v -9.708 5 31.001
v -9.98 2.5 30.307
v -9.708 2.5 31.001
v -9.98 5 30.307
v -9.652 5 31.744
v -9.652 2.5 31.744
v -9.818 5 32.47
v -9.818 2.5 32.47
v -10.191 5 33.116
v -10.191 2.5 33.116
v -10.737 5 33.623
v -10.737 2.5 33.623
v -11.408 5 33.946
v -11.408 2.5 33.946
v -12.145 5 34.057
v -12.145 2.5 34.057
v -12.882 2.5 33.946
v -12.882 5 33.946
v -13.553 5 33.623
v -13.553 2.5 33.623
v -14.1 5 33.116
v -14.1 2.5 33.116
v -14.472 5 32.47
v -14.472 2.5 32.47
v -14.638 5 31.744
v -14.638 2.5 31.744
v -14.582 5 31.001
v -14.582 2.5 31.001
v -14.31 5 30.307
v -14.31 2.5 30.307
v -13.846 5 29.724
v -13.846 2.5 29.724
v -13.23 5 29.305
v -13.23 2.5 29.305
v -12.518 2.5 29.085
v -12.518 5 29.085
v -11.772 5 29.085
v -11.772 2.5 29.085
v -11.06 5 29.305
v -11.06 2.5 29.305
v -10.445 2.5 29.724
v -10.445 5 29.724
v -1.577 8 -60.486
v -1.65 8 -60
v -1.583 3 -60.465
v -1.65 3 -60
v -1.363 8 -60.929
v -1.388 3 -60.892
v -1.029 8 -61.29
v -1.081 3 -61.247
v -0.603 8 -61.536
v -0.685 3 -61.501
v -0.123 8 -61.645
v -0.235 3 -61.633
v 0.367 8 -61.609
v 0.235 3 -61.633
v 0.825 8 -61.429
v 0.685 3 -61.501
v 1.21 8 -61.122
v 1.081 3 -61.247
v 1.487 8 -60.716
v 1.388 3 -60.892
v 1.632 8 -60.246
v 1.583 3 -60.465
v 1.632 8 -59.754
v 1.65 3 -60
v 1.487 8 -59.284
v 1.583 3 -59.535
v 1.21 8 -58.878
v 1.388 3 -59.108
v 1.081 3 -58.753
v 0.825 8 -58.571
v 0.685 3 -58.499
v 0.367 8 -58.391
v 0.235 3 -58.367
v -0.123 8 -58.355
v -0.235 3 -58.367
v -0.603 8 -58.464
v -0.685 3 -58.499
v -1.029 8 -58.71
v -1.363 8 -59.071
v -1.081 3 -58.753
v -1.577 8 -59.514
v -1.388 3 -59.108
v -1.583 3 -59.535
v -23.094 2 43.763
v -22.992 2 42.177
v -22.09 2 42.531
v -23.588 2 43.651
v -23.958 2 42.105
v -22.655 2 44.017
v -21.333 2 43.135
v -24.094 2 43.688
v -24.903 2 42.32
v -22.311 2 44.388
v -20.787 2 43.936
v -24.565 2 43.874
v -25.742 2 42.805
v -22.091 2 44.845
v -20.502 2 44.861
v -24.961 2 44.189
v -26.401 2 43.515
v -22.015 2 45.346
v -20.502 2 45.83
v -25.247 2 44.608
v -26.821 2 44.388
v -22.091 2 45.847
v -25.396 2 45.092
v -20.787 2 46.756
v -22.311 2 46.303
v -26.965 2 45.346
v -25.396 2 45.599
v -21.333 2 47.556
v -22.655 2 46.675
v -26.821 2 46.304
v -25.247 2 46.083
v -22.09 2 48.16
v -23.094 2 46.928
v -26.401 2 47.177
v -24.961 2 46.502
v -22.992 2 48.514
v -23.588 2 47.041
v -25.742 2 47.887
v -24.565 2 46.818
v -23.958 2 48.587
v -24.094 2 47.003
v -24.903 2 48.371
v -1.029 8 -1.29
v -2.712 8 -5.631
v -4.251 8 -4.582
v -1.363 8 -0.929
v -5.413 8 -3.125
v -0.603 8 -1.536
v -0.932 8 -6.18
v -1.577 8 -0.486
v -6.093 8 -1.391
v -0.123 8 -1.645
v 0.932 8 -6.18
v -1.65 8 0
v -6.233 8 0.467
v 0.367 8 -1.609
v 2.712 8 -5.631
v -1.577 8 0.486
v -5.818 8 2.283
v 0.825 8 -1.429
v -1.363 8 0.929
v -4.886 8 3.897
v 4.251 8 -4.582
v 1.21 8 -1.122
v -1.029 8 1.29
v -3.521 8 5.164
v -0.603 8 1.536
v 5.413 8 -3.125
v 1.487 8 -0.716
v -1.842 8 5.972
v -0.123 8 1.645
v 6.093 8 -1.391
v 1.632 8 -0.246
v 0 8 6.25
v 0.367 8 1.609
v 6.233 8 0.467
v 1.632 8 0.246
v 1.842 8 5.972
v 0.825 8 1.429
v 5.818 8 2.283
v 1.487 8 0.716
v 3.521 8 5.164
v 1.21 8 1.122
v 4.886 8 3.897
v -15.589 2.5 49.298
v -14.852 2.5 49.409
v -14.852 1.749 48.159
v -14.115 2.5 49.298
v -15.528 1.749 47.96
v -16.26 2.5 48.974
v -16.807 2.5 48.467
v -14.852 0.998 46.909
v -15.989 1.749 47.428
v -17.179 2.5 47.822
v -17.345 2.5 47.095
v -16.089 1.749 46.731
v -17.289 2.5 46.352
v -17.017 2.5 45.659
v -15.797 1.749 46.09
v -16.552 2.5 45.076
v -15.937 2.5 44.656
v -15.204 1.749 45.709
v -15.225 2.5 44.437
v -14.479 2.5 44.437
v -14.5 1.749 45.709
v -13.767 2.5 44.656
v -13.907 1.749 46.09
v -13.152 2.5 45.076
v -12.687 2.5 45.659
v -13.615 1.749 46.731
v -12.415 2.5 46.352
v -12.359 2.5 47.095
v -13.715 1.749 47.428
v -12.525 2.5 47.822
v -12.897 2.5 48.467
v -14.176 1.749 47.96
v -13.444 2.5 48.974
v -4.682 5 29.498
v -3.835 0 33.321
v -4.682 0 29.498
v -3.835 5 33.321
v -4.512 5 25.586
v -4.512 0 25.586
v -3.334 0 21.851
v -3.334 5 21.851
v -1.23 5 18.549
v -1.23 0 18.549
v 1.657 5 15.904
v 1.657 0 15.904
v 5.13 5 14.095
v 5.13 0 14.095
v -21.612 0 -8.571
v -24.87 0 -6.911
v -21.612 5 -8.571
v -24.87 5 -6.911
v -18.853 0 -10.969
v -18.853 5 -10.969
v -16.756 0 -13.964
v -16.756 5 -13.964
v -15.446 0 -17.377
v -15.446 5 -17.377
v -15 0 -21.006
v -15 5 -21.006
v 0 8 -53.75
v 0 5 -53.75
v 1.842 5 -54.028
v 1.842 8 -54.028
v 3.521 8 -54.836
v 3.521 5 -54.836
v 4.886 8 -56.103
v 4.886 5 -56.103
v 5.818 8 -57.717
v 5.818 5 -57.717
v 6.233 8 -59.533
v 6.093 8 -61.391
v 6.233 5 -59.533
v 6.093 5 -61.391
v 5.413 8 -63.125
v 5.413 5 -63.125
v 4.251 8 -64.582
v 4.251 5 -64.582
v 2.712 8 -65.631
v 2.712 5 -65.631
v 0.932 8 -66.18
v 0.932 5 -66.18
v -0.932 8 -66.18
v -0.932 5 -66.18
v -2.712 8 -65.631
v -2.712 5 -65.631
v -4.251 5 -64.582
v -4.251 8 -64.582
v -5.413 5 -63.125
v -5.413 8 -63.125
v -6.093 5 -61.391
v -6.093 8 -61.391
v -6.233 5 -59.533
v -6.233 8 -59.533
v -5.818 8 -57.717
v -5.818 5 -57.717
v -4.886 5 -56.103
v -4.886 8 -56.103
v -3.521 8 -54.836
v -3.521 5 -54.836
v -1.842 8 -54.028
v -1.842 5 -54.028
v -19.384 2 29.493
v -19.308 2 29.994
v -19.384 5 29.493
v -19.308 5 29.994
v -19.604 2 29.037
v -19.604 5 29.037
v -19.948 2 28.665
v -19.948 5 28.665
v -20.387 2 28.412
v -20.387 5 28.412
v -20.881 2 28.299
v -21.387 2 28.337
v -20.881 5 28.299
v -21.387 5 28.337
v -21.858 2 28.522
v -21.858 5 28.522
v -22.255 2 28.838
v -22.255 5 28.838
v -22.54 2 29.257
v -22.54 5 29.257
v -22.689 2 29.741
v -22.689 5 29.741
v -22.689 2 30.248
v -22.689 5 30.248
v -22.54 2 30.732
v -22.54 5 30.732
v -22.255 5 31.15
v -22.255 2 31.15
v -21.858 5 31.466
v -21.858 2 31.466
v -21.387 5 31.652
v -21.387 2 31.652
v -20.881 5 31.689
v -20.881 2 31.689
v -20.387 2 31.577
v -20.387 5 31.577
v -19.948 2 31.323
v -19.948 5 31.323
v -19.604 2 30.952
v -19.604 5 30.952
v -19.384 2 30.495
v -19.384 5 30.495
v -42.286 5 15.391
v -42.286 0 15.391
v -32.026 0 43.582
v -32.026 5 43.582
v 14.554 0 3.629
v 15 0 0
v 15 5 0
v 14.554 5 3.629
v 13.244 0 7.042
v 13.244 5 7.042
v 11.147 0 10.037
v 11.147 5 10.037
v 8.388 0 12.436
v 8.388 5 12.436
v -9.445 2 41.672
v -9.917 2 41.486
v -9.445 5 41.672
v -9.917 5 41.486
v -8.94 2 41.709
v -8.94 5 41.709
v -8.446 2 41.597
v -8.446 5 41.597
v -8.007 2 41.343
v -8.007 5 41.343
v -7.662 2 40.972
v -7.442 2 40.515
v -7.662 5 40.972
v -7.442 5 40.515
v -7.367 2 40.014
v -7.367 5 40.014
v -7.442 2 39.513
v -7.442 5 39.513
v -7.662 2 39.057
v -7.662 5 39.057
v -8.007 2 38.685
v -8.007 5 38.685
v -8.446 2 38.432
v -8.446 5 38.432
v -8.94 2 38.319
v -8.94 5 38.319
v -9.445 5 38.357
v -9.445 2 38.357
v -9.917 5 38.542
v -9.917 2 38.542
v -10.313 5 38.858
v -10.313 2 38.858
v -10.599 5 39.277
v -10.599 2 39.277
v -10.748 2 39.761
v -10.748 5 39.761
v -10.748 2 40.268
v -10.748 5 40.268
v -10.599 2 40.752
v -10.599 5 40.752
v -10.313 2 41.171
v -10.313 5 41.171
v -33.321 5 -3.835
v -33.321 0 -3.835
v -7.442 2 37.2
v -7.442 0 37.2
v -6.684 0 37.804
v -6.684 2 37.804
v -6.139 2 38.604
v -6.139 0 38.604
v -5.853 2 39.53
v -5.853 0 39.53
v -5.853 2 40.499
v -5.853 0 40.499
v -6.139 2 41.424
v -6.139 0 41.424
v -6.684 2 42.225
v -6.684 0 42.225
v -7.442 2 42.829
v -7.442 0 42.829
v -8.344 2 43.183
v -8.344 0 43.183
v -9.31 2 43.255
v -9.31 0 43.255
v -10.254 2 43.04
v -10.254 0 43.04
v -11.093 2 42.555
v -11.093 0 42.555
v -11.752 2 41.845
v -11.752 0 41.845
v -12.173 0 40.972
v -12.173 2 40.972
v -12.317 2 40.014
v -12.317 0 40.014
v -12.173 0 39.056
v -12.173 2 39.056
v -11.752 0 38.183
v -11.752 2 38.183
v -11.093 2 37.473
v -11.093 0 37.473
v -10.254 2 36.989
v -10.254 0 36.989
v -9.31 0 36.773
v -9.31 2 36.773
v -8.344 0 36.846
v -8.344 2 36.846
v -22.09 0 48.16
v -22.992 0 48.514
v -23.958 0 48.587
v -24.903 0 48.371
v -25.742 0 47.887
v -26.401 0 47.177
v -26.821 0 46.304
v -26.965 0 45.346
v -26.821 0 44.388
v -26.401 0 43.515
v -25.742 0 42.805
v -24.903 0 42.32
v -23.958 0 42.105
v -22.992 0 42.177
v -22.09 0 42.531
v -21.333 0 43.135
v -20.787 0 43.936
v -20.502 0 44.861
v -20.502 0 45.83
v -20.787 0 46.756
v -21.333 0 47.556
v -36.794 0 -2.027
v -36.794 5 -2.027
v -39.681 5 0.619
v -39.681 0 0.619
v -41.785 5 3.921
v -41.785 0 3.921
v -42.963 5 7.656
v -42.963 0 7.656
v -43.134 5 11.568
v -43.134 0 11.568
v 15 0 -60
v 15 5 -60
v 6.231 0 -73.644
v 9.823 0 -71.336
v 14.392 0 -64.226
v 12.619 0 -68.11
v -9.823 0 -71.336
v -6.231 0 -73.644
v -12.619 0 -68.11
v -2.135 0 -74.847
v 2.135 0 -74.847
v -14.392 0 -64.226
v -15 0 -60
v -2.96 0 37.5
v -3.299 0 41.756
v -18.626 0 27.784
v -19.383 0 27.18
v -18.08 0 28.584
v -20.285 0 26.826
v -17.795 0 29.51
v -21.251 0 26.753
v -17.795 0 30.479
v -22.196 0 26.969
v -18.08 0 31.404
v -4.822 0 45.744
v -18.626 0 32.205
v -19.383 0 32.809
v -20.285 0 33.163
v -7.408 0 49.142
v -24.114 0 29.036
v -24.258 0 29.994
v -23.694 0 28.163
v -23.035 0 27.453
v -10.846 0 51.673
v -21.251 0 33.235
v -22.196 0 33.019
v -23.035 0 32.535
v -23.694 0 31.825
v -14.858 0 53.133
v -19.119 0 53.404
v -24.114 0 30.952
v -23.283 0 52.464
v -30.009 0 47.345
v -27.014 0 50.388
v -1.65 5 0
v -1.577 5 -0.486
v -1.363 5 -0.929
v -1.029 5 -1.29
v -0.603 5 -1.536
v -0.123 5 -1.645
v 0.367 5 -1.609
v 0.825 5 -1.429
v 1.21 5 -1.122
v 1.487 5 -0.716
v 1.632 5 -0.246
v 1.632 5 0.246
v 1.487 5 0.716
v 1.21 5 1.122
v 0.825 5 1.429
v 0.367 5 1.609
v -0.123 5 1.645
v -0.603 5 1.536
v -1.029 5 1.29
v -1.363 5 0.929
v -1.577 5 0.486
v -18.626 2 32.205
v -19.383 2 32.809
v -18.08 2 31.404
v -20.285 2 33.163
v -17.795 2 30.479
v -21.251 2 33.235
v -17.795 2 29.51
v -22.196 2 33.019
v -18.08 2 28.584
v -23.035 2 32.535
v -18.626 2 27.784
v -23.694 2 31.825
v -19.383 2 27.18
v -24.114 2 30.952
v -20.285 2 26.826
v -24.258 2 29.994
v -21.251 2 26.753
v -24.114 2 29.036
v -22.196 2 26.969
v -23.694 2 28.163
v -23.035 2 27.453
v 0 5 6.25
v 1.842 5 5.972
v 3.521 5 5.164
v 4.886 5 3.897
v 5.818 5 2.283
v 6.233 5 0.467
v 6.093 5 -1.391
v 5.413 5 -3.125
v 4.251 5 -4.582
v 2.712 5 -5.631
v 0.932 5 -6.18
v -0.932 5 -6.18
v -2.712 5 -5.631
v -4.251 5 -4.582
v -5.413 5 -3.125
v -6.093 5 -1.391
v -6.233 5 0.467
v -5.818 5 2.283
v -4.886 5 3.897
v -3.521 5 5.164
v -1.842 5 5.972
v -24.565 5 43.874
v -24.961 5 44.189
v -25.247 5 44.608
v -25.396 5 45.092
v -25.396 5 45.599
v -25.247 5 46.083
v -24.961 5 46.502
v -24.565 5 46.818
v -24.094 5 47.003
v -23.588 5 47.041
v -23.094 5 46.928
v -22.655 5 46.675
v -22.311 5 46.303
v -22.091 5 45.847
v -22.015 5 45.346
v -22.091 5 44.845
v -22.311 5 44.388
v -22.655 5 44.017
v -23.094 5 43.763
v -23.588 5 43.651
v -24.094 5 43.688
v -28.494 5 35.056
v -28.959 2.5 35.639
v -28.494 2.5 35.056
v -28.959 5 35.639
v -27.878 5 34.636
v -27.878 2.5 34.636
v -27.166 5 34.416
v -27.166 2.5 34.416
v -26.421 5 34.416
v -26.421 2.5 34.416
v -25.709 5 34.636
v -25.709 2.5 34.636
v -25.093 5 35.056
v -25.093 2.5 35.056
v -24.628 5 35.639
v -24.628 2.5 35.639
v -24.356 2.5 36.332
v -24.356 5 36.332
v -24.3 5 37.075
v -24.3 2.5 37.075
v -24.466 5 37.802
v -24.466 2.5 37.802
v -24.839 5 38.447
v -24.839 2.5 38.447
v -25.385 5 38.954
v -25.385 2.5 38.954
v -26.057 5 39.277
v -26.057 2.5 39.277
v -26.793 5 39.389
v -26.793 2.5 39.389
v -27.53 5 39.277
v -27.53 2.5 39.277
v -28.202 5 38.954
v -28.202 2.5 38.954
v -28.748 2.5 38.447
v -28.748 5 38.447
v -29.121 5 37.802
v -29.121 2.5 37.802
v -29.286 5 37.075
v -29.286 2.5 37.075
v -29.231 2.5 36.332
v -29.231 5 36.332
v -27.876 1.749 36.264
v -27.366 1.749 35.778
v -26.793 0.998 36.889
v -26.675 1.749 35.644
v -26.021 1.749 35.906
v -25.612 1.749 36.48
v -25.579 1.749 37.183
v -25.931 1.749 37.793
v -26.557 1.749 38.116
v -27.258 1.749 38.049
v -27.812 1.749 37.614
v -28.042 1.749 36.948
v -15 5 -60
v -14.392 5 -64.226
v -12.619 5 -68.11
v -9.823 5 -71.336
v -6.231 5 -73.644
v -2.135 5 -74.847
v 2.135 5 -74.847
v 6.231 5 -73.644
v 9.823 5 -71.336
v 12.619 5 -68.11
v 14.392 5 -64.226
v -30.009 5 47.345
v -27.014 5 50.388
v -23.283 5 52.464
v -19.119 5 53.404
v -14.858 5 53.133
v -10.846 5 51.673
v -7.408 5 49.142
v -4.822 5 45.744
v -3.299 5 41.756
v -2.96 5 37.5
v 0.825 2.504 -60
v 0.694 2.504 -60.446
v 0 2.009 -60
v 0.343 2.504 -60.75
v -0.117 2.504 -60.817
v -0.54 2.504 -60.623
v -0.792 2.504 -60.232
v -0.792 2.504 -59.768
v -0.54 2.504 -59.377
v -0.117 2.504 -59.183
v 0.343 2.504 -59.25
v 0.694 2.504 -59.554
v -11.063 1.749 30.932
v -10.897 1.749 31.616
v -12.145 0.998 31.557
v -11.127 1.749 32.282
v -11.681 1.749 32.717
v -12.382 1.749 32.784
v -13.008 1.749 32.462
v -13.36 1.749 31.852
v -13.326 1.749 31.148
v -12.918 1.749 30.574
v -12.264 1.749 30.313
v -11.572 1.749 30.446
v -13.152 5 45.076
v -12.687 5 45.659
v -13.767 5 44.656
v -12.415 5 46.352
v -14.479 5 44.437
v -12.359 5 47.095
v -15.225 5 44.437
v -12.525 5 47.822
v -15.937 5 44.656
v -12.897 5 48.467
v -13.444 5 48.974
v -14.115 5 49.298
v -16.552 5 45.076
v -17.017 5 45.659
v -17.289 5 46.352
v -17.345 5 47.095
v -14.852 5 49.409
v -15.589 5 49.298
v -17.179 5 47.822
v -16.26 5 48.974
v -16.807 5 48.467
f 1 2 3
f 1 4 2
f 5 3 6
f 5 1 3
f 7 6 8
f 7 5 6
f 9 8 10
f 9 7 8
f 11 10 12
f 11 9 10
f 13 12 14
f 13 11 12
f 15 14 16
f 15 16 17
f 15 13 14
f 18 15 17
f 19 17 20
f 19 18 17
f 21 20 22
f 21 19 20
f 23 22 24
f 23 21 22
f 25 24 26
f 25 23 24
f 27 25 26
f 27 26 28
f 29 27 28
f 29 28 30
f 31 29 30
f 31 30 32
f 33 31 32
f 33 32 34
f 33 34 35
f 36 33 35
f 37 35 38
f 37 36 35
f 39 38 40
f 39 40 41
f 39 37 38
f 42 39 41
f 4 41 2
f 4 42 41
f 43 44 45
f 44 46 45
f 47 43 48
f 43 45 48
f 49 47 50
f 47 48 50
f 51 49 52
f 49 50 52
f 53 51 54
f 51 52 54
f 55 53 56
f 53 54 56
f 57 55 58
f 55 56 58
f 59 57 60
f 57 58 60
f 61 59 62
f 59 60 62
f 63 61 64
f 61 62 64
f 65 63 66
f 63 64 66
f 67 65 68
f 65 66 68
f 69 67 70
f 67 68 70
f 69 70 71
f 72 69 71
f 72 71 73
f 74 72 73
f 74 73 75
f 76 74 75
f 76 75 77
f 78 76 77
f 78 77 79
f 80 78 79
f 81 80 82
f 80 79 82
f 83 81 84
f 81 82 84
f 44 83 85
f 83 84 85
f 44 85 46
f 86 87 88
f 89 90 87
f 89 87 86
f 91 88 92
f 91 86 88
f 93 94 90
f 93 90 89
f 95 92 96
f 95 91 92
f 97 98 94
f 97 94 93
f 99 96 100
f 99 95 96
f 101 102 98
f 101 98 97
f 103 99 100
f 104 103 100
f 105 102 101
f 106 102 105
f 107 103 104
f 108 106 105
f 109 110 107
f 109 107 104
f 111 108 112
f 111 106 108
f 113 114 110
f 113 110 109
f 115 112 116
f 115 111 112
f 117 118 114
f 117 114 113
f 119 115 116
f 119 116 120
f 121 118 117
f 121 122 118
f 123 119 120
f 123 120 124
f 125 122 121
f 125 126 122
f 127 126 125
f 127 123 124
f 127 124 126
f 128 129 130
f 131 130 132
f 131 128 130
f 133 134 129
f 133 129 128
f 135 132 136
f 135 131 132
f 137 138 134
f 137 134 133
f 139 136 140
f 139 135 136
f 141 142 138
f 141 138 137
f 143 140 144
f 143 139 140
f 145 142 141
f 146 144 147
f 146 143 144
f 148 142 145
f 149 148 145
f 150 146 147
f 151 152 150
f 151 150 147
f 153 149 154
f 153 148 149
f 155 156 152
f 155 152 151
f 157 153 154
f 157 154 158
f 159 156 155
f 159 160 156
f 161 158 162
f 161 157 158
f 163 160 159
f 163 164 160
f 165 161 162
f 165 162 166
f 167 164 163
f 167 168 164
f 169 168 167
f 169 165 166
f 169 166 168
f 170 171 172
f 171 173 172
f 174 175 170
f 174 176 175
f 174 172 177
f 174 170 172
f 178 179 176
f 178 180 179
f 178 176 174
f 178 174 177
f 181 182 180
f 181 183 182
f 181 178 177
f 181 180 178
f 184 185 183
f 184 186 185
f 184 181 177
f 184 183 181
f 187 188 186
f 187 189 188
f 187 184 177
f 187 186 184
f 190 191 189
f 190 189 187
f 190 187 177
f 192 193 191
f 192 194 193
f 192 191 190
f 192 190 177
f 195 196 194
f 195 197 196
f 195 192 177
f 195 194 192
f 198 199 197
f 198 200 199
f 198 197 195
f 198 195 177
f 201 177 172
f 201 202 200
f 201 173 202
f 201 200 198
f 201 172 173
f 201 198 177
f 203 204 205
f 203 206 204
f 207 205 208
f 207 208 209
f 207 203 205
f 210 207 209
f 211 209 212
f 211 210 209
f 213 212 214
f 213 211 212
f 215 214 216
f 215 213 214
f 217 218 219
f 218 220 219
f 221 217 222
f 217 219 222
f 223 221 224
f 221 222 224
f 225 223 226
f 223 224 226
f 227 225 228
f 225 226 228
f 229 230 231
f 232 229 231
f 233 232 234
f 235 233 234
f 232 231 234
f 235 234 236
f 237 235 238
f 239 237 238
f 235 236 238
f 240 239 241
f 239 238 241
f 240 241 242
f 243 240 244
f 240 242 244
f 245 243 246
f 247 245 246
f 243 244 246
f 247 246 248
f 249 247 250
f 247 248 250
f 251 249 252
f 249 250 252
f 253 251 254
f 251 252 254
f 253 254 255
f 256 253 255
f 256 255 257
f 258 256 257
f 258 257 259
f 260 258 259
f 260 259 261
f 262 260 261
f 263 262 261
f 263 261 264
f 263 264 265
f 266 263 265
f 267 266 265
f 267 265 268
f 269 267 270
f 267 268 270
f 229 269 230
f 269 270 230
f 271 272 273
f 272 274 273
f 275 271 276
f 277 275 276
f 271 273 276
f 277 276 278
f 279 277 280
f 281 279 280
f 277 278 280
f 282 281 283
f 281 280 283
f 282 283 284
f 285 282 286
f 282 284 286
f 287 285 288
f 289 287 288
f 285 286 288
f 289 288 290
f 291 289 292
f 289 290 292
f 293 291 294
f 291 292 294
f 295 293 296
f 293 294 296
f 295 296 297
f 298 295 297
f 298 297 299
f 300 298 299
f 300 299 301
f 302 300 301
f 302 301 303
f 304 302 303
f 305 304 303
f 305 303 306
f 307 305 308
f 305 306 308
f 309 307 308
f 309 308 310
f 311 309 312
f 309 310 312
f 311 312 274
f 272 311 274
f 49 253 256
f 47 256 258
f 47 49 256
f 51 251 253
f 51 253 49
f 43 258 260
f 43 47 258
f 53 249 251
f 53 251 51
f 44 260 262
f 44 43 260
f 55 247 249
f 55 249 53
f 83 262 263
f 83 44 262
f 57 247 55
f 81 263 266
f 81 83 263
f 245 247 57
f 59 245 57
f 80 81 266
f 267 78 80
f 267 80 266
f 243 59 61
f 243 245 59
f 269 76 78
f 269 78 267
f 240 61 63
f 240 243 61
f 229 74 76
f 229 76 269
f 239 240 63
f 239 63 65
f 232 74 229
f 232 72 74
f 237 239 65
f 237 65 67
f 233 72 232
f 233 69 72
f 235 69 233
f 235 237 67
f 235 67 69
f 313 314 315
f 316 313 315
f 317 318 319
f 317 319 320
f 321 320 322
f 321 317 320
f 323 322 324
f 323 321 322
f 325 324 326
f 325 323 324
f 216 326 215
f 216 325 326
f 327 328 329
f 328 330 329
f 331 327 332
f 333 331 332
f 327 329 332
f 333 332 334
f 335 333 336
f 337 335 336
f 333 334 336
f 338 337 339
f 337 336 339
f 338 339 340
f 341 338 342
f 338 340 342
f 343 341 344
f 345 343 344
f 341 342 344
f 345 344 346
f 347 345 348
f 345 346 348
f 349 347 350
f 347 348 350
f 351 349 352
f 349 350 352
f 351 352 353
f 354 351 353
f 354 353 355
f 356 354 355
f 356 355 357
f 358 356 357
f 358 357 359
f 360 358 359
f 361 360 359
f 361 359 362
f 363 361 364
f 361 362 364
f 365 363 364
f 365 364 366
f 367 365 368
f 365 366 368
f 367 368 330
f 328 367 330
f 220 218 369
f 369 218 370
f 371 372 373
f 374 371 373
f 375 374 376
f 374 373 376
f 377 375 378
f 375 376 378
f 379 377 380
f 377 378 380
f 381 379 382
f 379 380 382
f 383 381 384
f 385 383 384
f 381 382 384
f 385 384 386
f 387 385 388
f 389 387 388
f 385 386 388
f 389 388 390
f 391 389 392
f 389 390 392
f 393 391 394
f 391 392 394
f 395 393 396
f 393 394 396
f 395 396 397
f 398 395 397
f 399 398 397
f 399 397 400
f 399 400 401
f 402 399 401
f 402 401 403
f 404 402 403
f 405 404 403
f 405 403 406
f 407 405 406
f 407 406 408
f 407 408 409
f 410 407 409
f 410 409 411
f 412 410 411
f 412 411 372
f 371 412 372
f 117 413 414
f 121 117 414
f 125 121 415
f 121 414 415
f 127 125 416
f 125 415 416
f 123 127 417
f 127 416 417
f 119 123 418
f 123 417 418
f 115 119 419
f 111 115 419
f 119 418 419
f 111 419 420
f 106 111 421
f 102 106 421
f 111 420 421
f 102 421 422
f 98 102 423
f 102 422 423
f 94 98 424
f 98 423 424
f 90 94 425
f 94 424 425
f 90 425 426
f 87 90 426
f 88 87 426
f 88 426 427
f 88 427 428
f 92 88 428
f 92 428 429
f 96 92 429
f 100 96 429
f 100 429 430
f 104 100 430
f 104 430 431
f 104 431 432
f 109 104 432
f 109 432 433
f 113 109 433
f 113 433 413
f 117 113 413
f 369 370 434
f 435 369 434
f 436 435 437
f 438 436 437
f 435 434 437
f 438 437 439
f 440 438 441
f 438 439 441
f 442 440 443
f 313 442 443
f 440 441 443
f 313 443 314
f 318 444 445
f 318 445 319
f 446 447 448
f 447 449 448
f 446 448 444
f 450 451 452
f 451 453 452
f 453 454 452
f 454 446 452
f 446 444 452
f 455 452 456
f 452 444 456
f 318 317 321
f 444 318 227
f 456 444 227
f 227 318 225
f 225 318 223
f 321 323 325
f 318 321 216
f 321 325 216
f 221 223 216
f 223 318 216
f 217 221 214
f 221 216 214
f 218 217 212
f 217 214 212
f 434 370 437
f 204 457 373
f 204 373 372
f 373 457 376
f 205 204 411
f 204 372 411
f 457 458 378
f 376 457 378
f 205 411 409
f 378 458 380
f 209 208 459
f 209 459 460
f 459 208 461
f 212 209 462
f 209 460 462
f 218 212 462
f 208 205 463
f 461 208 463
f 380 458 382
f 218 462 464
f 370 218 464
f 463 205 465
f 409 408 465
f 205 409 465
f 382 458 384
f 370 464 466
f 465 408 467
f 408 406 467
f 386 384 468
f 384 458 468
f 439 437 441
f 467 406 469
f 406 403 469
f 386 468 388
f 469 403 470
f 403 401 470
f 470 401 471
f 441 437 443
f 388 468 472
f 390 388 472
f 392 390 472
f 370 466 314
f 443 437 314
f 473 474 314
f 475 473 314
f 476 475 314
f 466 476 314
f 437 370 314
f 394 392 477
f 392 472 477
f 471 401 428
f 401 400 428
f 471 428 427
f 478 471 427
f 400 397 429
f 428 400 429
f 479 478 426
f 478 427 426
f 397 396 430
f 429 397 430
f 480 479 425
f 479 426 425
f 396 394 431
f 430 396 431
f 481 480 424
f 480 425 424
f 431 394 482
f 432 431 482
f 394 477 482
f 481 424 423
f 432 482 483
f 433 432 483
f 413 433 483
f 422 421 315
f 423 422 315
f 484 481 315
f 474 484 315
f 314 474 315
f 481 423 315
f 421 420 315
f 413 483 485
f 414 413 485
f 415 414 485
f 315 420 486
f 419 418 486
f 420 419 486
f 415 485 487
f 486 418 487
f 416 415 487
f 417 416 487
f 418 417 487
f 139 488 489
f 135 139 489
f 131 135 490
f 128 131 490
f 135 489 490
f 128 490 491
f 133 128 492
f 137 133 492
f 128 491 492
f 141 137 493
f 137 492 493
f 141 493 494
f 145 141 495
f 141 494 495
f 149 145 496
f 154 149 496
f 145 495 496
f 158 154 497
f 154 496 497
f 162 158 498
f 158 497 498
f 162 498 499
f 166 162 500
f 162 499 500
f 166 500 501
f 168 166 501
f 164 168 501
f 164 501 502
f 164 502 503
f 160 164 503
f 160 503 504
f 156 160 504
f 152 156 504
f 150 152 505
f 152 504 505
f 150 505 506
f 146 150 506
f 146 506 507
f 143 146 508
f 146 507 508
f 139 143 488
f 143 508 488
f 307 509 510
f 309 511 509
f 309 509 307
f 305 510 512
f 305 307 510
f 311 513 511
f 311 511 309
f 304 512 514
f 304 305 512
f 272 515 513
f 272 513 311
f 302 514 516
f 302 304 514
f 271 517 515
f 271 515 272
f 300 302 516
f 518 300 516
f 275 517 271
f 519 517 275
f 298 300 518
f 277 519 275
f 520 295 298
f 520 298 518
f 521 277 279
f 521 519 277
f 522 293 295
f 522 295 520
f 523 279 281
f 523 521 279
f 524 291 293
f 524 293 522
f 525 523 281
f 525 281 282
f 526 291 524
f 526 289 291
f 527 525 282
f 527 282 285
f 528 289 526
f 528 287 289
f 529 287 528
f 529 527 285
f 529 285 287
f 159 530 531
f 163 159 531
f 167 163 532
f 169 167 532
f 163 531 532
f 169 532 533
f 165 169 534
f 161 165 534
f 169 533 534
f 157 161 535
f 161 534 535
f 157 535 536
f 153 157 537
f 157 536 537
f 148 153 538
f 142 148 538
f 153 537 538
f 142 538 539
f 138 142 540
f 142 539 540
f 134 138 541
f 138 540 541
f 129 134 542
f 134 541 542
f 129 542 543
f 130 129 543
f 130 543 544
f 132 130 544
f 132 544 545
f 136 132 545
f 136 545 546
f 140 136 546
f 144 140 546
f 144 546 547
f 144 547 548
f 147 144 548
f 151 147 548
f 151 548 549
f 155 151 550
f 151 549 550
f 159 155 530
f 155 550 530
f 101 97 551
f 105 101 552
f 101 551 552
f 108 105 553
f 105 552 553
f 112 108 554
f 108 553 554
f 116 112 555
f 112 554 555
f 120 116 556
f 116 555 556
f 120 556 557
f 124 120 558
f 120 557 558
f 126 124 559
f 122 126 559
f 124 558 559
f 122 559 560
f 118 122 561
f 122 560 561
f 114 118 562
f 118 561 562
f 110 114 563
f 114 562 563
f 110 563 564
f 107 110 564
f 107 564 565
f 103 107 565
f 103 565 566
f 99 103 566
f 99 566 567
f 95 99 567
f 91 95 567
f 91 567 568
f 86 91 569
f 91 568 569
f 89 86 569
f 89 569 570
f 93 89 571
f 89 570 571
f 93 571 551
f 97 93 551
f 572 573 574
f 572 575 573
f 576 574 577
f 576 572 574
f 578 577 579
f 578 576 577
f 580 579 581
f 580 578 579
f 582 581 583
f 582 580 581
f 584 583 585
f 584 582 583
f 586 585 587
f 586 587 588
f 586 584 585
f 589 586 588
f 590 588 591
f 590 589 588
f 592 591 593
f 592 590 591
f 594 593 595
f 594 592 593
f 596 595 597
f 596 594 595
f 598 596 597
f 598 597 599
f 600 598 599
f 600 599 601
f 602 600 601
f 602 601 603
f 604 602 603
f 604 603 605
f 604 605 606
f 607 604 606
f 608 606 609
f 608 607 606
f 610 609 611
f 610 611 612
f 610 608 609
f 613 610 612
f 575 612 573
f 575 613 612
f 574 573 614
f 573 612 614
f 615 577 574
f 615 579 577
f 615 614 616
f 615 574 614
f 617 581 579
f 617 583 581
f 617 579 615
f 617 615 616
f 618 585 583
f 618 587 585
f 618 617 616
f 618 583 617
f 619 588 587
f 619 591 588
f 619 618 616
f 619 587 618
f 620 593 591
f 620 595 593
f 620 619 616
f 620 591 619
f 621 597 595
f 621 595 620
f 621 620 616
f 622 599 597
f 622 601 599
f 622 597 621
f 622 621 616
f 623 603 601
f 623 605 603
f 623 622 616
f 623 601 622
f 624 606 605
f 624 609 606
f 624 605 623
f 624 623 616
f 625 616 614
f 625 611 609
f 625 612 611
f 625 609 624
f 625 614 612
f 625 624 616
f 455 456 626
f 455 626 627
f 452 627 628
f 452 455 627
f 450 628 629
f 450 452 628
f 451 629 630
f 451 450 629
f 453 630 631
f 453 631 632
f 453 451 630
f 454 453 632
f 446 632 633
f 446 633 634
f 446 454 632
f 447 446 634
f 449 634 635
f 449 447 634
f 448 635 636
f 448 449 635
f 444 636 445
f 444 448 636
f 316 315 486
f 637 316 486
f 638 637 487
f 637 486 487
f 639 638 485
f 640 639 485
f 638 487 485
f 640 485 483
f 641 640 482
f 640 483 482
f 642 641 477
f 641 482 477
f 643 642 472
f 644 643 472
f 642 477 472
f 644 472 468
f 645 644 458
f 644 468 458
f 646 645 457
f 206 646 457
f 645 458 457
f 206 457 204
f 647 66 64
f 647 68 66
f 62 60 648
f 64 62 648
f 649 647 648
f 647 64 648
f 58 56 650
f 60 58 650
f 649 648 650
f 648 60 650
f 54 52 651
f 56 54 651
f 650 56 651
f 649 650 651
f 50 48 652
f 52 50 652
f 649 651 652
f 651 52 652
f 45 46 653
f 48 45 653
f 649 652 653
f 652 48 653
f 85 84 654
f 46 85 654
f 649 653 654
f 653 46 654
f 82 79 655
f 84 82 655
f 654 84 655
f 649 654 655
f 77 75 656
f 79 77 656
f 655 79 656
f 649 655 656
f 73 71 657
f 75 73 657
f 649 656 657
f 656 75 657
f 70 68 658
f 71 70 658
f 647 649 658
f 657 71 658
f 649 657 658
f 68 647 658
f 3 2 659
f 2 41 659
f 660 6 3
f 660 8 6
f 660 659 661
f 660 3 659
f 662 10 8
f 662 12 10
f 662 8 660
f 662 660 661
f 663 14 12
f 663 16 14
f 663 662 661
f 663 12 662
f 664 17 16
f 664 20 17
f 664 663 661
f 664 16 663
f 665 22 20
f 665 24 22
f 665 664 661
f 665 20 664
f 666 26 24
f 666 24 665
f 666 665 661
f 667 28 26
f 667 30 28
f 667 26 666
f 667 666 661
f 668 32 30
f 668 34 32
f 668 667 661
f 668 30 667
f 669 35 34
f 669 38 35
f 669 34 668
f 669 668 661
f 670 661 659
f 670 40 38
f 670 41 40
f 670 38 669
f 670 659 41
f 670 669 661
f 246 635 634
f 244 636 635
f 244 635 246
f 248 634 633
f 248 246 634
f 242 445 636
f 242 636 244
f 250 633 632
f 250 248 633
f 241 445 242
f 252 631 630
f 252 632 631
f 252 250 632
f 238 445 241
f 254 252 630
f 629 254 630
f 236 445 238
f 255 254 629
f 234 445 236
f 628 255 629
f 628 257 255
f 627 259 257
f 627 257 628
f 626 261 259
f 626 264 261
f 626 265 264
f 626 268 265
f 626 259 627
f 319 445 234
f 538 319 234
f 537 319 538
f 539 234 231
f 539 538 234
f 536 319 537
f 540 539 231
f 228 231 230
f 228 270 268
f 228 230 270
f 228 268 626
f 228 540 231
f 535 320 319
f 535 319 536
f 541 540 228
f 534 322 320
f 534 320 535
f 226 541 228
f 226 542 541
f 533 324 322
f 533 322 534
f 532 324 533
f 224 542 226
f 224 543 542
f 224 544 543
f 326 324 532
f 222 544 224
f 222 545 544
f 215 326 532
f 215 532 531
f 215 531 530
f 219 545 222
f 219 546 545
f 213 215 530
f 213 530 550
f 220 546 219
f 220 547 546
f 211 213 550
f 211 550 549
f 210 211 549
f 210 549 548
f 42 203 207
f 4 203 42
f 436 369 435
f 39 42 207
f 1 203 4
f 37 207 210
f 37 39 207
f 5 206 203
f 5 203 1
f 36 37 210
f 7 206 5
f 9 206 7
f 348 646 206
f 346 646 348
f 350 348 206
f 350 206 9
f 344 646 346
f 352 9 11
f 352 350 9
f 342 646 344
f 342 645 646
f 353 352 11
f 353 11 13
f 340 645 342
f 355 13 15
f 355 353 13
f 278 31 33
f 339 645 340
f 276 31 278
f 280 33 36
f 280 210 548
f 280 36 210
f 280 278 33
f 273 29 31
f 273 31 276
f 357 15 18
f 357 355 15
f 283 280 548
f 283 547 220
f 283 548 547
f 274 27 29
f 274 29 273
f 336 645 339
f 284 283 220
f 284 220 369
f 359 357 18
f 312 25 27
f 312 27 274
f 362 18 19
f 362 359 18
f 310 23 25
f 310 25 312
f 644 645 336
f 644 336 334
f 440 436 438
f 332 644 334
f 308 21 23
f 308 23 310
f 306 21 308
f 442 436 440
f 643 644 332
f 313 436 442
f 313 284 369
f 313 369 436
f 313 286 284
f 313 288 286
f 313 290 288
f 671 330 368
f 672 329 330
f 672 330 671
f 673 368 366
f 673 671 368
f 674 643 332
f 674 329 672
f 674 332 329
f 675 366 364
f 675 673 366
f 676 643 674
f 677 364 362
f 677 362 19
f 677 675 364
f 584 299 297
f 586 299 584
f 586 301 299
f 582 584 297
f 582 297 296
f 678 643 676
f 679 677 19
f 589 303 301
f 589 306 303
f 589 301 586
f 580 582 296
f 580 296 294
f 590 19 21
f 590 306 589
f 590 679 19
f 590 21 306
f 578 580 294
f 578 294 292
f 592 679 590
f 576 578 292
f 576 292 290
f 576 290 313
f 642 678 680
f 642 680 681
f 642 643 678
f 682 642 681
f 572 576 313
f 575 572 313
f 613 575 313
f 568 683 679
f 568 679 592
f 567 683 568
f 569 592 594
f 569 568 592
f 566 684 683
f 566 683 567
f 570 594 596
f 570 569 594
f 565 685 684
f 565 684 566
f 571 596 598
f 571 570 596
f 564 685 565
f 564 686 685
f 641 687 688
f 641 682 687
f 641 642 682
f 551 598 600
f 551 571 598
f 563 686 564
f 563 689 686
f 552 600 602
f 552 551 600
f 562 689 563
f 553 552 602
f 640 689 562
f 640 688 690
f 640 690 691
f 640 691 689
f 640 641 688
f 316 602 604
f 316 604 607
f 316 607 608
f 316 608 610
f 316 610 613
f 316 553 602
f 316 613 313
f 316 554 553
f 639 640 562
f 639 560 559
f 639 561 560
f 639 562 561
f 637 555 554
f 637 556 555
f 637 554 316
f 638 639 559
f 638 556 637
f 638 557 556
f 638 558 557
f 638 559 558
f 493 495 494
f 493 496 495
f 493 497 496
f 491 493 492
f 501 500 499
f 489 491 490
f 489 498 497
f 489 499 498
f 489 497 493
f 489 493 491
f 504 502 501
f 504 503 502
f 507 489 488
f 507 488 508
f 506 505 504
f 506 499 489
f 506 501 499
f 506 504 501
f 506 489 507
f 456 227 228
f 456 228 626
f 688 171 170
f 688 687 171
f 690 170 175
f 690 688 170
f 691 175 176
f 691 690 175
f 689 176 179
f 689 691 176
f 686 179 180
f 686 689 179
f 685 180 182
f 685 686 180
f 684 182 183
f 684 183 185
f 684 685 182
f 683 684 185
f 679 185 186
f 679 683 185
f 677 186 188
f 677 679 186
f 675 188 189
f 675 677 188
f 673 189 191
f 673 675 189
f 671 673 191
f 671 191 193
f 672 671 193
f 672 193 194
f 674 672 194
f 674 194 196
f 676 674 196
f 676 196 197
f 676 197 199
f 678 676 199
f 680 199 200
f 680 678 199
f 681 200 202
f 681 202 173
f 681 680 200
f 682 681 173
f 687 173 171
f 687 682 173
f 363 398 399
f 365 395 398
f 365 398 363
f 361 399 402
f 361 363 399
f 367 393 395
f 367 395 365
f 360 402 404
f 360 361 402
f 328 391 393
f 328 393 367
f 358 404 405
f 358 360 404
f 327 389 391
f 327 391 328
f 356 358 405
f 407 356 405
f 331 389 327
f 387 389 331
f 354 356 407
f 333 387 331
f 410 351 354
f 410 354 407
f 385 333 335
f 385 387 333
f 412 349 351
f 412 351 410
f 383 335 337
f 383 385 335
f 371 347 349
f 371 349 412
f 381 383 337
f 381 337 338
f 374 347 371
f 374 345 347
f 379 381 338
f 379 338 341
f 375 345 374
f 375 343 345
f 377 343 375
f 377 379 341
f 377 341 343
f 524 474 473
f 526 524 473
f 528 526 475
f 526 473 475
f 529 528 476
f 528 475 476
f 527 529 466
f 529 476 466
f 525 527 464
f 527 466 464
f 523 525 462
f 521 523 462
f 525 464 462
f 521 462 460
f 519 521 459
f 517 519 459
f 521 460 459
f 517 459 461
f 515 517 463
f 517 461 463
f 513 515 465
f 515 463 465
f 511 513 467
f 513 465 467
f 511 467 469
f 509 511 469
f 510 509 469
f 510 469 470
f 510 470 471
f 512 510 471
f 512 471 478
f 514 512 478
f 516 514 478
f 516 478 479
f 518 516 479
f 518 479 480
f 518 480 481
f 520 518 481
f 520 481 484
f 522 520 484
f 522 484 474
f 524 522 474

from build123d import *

# Parameters (mm, degrees)
EXTRUDE_1_DEPTH              = 5
SKETCH_2_R                   = 6.25
EXTRUDE_2_DEPTH              = 3
HOLE_WIZARD_M4_1_D           = 3.3
HOLE_WIZARD_M4_1_DEPTH       = 5
HOLE_WIZARD_M4_1_TIP         = 0.991420021
EXTRUDE_3_DEPTH              = 5
EXTRUDE_4_DEPTH              = 5
HOLE_WIZARD_M3_1_D           = 3.4
HOLE_WIZARD_M3_1_CBORE_D     = 6.5
HOLE_WIZARD_M3_1_CBORE_DEPTH = 2
PATTERN_CIRCULAR_2_COUNT     = 3
PATTERN_CIRCULAR_3_COUNT     = 3
FILLET_1_R                   = 15


with BuildPart() as part:
    # 스케치1 → 보스-돌출1 (new body)
    with BuildSketch(Plane(origin=(0, 0, 0), x_dir=(1, 0, 0), z_dir=(0, 1, 0))):
        with BuildLine():
            Line((-15, 0), (-15, 60))
            ThreePointArc((-15, 60), (0, 75), (15, 60))
            Line((15, 60), (15, 0))
            ThreePointArc((15, 0), (0, -15), (-15, 0))
        make_face()
    extrude(amount=EXTRUDE_1_DEPTH)

    # 스케치2 → 보스-돌출2 (add)
    with BuildSketch(Plane(origin=(0, 5, 0), x_dir=(1, 0, 0), z_dir=(0, 1, 0))):
        with Locations(Location((0, 60, 0), (0, 0, 270))):
            Circle(SKETCH_2_R)
        with Locations(Location((0, 0, 0), (0, 0, 270))):
            Circle(SKETCH_2_R)
    extrude(amount=EXTRUDE_2_DEPTH)

    # M4 탭을 위한 탭 드릴1
    with Locations(Plane(origin=(0, 8, 0), x_dir=(1, 0, 0), z_dir=(0, 1, 0))):
        with Locations((0, 0), (0, 60)):
            Hole(HOLE_WIZARD_M4_1_D / 2, depth=HOLE_WIZARD_M4_1_DEPTH)
            with Locations((0, 0, -(HOLE_WIZARD_M4_1_DEPTH + HOLE_WIZARD_M4_1_TIP / 2))):  # 118° drill point
                Cone(0, HOLE_WIZARD_M4_1_D / 2, HOLE_WIZARD_M4_1_TIP, mode=Mode.SUBTRACT)

    # 스케치9 → 보스-돌출3 (add)
    with BuildSketch(Plane.XZ):
        with BuildLine():
            Line((-5.13030215, -14.095389312), (-33.321080773, -3.834785012))
            ThreePointArc((-33.321080773, -3.834785012), (-42.286167935, 15.39090645), (-23.060476474, 24.355993612))
            Line((-23.060476474, 24.355993612), (5.13030215, 14.095389312))
            ThreePointArc((5.13030215, 14.095389312), (14.095389312, -5.13030215), (-5.13030215, -14.095389312))
        make_face()
    extrude(amount=-EXTRUDE_3_DEPTH)

    # 스케치10 → 보스-돌출4 (add)
    with BuildSketch(Plane.XZ):
        with BuildLine():
            Line((-42.286167935, 15.39090645), (-32.025563636, 43.581685073))
            ThreePointArc((-32.025563636, 43.581685073), (-12.799872174, 52.546772235), (-3.834785012, 33.321080773))
            Line((-3.834785012, 33.321080773), (-14.095389312, 5.13030215))
            ThreePointArc((-14.095389312, 5.13030215), (-33.321080773, -3.834785012), (-42.286167935, 15.39090645))
        make_face()
    extrude(amount=-EXTRUDE_4_DEPTH)

    # M3 육각 소켓 머리 캡 나사용 카운터보어1 (through all)
    with Locations(Plane(origin=(0, 0, 0), x_dir=(-1, 0, 0), z_dir=(0, -1, 0))):
        with Locations((21.008355614, -29.994149336)):
            hole_wizard_m3_1 = CounterBoreHole(HOLE_WIZARD_M3_1_D / 2, HOLE_WIZARD_M3_1_CBORE_D / 2, HOLE_WIZARD_M3_1_CBORE_DEPTH)

    # 원형 패턴2: M3 육각 소켓 머리 캡 나사용 카운터보어1 ×3 about axis
    pattern_circular_2_axis = Axis((-17.930174324, 0, 38.451382923), (0, 1, 0))
    for i in range(1, PATTERN_CIRCULAR_2_COUNT):
        add(hole_wizard_m3_1.rotate(pattern_circular_2_axis, i * 360 / PATTERN_CIRCULAR_2_COUNT), mode=Mode.SUBTRACT)

    # 스케치18 → Ø5.0mm 맞춤핀 구멍1 (revolve, cut)
    with BuildSketch(Plane(origin=(-14.851993034, 5, 46.90861651), x_dir=(0, 0, 1), z_dir=(1, 0, 0))):
        Polygon((0, 0), (0, 4.002151548), (2.5, 2.5), (2.5, 0), align=None)
    f_5_0mm_1 = revolve(axis=Axis((-14.851993034, 11.35, 46.90861651), (0, -1, 0)), mode=Mode.SUBTRACT)

    # 원형 패턴3: Ø5.0mm 맞춤핀 구멍1 ×3 about axis
    pattern_circular_3_axis = Axis((-17.930174324, 0, 38.451382923), (0, 1, 0))
    for i in range(1, PATTERN_CIRCULAR_3_COUNT):
        add(f_5_0mm_1.rotate(pattern_circular_3_axis, i * 360 / PATTERN_CIRCULAR_3_COUNT), mode=Mode.SUBTRACT)

    # 필렛1
    fillet_1_edges = [part.edges().sort_by_distance(p)[0] for p in [
        (-8.965087162, 2.5, 19.225691462),
        (-15, 2.5, -10.503113073),
    ]]
    fillet(fillet_1_edges, radius=FILLET_1_R - 0.0001)  # a hair under: the kernel refuses the full size


solid = part.part
